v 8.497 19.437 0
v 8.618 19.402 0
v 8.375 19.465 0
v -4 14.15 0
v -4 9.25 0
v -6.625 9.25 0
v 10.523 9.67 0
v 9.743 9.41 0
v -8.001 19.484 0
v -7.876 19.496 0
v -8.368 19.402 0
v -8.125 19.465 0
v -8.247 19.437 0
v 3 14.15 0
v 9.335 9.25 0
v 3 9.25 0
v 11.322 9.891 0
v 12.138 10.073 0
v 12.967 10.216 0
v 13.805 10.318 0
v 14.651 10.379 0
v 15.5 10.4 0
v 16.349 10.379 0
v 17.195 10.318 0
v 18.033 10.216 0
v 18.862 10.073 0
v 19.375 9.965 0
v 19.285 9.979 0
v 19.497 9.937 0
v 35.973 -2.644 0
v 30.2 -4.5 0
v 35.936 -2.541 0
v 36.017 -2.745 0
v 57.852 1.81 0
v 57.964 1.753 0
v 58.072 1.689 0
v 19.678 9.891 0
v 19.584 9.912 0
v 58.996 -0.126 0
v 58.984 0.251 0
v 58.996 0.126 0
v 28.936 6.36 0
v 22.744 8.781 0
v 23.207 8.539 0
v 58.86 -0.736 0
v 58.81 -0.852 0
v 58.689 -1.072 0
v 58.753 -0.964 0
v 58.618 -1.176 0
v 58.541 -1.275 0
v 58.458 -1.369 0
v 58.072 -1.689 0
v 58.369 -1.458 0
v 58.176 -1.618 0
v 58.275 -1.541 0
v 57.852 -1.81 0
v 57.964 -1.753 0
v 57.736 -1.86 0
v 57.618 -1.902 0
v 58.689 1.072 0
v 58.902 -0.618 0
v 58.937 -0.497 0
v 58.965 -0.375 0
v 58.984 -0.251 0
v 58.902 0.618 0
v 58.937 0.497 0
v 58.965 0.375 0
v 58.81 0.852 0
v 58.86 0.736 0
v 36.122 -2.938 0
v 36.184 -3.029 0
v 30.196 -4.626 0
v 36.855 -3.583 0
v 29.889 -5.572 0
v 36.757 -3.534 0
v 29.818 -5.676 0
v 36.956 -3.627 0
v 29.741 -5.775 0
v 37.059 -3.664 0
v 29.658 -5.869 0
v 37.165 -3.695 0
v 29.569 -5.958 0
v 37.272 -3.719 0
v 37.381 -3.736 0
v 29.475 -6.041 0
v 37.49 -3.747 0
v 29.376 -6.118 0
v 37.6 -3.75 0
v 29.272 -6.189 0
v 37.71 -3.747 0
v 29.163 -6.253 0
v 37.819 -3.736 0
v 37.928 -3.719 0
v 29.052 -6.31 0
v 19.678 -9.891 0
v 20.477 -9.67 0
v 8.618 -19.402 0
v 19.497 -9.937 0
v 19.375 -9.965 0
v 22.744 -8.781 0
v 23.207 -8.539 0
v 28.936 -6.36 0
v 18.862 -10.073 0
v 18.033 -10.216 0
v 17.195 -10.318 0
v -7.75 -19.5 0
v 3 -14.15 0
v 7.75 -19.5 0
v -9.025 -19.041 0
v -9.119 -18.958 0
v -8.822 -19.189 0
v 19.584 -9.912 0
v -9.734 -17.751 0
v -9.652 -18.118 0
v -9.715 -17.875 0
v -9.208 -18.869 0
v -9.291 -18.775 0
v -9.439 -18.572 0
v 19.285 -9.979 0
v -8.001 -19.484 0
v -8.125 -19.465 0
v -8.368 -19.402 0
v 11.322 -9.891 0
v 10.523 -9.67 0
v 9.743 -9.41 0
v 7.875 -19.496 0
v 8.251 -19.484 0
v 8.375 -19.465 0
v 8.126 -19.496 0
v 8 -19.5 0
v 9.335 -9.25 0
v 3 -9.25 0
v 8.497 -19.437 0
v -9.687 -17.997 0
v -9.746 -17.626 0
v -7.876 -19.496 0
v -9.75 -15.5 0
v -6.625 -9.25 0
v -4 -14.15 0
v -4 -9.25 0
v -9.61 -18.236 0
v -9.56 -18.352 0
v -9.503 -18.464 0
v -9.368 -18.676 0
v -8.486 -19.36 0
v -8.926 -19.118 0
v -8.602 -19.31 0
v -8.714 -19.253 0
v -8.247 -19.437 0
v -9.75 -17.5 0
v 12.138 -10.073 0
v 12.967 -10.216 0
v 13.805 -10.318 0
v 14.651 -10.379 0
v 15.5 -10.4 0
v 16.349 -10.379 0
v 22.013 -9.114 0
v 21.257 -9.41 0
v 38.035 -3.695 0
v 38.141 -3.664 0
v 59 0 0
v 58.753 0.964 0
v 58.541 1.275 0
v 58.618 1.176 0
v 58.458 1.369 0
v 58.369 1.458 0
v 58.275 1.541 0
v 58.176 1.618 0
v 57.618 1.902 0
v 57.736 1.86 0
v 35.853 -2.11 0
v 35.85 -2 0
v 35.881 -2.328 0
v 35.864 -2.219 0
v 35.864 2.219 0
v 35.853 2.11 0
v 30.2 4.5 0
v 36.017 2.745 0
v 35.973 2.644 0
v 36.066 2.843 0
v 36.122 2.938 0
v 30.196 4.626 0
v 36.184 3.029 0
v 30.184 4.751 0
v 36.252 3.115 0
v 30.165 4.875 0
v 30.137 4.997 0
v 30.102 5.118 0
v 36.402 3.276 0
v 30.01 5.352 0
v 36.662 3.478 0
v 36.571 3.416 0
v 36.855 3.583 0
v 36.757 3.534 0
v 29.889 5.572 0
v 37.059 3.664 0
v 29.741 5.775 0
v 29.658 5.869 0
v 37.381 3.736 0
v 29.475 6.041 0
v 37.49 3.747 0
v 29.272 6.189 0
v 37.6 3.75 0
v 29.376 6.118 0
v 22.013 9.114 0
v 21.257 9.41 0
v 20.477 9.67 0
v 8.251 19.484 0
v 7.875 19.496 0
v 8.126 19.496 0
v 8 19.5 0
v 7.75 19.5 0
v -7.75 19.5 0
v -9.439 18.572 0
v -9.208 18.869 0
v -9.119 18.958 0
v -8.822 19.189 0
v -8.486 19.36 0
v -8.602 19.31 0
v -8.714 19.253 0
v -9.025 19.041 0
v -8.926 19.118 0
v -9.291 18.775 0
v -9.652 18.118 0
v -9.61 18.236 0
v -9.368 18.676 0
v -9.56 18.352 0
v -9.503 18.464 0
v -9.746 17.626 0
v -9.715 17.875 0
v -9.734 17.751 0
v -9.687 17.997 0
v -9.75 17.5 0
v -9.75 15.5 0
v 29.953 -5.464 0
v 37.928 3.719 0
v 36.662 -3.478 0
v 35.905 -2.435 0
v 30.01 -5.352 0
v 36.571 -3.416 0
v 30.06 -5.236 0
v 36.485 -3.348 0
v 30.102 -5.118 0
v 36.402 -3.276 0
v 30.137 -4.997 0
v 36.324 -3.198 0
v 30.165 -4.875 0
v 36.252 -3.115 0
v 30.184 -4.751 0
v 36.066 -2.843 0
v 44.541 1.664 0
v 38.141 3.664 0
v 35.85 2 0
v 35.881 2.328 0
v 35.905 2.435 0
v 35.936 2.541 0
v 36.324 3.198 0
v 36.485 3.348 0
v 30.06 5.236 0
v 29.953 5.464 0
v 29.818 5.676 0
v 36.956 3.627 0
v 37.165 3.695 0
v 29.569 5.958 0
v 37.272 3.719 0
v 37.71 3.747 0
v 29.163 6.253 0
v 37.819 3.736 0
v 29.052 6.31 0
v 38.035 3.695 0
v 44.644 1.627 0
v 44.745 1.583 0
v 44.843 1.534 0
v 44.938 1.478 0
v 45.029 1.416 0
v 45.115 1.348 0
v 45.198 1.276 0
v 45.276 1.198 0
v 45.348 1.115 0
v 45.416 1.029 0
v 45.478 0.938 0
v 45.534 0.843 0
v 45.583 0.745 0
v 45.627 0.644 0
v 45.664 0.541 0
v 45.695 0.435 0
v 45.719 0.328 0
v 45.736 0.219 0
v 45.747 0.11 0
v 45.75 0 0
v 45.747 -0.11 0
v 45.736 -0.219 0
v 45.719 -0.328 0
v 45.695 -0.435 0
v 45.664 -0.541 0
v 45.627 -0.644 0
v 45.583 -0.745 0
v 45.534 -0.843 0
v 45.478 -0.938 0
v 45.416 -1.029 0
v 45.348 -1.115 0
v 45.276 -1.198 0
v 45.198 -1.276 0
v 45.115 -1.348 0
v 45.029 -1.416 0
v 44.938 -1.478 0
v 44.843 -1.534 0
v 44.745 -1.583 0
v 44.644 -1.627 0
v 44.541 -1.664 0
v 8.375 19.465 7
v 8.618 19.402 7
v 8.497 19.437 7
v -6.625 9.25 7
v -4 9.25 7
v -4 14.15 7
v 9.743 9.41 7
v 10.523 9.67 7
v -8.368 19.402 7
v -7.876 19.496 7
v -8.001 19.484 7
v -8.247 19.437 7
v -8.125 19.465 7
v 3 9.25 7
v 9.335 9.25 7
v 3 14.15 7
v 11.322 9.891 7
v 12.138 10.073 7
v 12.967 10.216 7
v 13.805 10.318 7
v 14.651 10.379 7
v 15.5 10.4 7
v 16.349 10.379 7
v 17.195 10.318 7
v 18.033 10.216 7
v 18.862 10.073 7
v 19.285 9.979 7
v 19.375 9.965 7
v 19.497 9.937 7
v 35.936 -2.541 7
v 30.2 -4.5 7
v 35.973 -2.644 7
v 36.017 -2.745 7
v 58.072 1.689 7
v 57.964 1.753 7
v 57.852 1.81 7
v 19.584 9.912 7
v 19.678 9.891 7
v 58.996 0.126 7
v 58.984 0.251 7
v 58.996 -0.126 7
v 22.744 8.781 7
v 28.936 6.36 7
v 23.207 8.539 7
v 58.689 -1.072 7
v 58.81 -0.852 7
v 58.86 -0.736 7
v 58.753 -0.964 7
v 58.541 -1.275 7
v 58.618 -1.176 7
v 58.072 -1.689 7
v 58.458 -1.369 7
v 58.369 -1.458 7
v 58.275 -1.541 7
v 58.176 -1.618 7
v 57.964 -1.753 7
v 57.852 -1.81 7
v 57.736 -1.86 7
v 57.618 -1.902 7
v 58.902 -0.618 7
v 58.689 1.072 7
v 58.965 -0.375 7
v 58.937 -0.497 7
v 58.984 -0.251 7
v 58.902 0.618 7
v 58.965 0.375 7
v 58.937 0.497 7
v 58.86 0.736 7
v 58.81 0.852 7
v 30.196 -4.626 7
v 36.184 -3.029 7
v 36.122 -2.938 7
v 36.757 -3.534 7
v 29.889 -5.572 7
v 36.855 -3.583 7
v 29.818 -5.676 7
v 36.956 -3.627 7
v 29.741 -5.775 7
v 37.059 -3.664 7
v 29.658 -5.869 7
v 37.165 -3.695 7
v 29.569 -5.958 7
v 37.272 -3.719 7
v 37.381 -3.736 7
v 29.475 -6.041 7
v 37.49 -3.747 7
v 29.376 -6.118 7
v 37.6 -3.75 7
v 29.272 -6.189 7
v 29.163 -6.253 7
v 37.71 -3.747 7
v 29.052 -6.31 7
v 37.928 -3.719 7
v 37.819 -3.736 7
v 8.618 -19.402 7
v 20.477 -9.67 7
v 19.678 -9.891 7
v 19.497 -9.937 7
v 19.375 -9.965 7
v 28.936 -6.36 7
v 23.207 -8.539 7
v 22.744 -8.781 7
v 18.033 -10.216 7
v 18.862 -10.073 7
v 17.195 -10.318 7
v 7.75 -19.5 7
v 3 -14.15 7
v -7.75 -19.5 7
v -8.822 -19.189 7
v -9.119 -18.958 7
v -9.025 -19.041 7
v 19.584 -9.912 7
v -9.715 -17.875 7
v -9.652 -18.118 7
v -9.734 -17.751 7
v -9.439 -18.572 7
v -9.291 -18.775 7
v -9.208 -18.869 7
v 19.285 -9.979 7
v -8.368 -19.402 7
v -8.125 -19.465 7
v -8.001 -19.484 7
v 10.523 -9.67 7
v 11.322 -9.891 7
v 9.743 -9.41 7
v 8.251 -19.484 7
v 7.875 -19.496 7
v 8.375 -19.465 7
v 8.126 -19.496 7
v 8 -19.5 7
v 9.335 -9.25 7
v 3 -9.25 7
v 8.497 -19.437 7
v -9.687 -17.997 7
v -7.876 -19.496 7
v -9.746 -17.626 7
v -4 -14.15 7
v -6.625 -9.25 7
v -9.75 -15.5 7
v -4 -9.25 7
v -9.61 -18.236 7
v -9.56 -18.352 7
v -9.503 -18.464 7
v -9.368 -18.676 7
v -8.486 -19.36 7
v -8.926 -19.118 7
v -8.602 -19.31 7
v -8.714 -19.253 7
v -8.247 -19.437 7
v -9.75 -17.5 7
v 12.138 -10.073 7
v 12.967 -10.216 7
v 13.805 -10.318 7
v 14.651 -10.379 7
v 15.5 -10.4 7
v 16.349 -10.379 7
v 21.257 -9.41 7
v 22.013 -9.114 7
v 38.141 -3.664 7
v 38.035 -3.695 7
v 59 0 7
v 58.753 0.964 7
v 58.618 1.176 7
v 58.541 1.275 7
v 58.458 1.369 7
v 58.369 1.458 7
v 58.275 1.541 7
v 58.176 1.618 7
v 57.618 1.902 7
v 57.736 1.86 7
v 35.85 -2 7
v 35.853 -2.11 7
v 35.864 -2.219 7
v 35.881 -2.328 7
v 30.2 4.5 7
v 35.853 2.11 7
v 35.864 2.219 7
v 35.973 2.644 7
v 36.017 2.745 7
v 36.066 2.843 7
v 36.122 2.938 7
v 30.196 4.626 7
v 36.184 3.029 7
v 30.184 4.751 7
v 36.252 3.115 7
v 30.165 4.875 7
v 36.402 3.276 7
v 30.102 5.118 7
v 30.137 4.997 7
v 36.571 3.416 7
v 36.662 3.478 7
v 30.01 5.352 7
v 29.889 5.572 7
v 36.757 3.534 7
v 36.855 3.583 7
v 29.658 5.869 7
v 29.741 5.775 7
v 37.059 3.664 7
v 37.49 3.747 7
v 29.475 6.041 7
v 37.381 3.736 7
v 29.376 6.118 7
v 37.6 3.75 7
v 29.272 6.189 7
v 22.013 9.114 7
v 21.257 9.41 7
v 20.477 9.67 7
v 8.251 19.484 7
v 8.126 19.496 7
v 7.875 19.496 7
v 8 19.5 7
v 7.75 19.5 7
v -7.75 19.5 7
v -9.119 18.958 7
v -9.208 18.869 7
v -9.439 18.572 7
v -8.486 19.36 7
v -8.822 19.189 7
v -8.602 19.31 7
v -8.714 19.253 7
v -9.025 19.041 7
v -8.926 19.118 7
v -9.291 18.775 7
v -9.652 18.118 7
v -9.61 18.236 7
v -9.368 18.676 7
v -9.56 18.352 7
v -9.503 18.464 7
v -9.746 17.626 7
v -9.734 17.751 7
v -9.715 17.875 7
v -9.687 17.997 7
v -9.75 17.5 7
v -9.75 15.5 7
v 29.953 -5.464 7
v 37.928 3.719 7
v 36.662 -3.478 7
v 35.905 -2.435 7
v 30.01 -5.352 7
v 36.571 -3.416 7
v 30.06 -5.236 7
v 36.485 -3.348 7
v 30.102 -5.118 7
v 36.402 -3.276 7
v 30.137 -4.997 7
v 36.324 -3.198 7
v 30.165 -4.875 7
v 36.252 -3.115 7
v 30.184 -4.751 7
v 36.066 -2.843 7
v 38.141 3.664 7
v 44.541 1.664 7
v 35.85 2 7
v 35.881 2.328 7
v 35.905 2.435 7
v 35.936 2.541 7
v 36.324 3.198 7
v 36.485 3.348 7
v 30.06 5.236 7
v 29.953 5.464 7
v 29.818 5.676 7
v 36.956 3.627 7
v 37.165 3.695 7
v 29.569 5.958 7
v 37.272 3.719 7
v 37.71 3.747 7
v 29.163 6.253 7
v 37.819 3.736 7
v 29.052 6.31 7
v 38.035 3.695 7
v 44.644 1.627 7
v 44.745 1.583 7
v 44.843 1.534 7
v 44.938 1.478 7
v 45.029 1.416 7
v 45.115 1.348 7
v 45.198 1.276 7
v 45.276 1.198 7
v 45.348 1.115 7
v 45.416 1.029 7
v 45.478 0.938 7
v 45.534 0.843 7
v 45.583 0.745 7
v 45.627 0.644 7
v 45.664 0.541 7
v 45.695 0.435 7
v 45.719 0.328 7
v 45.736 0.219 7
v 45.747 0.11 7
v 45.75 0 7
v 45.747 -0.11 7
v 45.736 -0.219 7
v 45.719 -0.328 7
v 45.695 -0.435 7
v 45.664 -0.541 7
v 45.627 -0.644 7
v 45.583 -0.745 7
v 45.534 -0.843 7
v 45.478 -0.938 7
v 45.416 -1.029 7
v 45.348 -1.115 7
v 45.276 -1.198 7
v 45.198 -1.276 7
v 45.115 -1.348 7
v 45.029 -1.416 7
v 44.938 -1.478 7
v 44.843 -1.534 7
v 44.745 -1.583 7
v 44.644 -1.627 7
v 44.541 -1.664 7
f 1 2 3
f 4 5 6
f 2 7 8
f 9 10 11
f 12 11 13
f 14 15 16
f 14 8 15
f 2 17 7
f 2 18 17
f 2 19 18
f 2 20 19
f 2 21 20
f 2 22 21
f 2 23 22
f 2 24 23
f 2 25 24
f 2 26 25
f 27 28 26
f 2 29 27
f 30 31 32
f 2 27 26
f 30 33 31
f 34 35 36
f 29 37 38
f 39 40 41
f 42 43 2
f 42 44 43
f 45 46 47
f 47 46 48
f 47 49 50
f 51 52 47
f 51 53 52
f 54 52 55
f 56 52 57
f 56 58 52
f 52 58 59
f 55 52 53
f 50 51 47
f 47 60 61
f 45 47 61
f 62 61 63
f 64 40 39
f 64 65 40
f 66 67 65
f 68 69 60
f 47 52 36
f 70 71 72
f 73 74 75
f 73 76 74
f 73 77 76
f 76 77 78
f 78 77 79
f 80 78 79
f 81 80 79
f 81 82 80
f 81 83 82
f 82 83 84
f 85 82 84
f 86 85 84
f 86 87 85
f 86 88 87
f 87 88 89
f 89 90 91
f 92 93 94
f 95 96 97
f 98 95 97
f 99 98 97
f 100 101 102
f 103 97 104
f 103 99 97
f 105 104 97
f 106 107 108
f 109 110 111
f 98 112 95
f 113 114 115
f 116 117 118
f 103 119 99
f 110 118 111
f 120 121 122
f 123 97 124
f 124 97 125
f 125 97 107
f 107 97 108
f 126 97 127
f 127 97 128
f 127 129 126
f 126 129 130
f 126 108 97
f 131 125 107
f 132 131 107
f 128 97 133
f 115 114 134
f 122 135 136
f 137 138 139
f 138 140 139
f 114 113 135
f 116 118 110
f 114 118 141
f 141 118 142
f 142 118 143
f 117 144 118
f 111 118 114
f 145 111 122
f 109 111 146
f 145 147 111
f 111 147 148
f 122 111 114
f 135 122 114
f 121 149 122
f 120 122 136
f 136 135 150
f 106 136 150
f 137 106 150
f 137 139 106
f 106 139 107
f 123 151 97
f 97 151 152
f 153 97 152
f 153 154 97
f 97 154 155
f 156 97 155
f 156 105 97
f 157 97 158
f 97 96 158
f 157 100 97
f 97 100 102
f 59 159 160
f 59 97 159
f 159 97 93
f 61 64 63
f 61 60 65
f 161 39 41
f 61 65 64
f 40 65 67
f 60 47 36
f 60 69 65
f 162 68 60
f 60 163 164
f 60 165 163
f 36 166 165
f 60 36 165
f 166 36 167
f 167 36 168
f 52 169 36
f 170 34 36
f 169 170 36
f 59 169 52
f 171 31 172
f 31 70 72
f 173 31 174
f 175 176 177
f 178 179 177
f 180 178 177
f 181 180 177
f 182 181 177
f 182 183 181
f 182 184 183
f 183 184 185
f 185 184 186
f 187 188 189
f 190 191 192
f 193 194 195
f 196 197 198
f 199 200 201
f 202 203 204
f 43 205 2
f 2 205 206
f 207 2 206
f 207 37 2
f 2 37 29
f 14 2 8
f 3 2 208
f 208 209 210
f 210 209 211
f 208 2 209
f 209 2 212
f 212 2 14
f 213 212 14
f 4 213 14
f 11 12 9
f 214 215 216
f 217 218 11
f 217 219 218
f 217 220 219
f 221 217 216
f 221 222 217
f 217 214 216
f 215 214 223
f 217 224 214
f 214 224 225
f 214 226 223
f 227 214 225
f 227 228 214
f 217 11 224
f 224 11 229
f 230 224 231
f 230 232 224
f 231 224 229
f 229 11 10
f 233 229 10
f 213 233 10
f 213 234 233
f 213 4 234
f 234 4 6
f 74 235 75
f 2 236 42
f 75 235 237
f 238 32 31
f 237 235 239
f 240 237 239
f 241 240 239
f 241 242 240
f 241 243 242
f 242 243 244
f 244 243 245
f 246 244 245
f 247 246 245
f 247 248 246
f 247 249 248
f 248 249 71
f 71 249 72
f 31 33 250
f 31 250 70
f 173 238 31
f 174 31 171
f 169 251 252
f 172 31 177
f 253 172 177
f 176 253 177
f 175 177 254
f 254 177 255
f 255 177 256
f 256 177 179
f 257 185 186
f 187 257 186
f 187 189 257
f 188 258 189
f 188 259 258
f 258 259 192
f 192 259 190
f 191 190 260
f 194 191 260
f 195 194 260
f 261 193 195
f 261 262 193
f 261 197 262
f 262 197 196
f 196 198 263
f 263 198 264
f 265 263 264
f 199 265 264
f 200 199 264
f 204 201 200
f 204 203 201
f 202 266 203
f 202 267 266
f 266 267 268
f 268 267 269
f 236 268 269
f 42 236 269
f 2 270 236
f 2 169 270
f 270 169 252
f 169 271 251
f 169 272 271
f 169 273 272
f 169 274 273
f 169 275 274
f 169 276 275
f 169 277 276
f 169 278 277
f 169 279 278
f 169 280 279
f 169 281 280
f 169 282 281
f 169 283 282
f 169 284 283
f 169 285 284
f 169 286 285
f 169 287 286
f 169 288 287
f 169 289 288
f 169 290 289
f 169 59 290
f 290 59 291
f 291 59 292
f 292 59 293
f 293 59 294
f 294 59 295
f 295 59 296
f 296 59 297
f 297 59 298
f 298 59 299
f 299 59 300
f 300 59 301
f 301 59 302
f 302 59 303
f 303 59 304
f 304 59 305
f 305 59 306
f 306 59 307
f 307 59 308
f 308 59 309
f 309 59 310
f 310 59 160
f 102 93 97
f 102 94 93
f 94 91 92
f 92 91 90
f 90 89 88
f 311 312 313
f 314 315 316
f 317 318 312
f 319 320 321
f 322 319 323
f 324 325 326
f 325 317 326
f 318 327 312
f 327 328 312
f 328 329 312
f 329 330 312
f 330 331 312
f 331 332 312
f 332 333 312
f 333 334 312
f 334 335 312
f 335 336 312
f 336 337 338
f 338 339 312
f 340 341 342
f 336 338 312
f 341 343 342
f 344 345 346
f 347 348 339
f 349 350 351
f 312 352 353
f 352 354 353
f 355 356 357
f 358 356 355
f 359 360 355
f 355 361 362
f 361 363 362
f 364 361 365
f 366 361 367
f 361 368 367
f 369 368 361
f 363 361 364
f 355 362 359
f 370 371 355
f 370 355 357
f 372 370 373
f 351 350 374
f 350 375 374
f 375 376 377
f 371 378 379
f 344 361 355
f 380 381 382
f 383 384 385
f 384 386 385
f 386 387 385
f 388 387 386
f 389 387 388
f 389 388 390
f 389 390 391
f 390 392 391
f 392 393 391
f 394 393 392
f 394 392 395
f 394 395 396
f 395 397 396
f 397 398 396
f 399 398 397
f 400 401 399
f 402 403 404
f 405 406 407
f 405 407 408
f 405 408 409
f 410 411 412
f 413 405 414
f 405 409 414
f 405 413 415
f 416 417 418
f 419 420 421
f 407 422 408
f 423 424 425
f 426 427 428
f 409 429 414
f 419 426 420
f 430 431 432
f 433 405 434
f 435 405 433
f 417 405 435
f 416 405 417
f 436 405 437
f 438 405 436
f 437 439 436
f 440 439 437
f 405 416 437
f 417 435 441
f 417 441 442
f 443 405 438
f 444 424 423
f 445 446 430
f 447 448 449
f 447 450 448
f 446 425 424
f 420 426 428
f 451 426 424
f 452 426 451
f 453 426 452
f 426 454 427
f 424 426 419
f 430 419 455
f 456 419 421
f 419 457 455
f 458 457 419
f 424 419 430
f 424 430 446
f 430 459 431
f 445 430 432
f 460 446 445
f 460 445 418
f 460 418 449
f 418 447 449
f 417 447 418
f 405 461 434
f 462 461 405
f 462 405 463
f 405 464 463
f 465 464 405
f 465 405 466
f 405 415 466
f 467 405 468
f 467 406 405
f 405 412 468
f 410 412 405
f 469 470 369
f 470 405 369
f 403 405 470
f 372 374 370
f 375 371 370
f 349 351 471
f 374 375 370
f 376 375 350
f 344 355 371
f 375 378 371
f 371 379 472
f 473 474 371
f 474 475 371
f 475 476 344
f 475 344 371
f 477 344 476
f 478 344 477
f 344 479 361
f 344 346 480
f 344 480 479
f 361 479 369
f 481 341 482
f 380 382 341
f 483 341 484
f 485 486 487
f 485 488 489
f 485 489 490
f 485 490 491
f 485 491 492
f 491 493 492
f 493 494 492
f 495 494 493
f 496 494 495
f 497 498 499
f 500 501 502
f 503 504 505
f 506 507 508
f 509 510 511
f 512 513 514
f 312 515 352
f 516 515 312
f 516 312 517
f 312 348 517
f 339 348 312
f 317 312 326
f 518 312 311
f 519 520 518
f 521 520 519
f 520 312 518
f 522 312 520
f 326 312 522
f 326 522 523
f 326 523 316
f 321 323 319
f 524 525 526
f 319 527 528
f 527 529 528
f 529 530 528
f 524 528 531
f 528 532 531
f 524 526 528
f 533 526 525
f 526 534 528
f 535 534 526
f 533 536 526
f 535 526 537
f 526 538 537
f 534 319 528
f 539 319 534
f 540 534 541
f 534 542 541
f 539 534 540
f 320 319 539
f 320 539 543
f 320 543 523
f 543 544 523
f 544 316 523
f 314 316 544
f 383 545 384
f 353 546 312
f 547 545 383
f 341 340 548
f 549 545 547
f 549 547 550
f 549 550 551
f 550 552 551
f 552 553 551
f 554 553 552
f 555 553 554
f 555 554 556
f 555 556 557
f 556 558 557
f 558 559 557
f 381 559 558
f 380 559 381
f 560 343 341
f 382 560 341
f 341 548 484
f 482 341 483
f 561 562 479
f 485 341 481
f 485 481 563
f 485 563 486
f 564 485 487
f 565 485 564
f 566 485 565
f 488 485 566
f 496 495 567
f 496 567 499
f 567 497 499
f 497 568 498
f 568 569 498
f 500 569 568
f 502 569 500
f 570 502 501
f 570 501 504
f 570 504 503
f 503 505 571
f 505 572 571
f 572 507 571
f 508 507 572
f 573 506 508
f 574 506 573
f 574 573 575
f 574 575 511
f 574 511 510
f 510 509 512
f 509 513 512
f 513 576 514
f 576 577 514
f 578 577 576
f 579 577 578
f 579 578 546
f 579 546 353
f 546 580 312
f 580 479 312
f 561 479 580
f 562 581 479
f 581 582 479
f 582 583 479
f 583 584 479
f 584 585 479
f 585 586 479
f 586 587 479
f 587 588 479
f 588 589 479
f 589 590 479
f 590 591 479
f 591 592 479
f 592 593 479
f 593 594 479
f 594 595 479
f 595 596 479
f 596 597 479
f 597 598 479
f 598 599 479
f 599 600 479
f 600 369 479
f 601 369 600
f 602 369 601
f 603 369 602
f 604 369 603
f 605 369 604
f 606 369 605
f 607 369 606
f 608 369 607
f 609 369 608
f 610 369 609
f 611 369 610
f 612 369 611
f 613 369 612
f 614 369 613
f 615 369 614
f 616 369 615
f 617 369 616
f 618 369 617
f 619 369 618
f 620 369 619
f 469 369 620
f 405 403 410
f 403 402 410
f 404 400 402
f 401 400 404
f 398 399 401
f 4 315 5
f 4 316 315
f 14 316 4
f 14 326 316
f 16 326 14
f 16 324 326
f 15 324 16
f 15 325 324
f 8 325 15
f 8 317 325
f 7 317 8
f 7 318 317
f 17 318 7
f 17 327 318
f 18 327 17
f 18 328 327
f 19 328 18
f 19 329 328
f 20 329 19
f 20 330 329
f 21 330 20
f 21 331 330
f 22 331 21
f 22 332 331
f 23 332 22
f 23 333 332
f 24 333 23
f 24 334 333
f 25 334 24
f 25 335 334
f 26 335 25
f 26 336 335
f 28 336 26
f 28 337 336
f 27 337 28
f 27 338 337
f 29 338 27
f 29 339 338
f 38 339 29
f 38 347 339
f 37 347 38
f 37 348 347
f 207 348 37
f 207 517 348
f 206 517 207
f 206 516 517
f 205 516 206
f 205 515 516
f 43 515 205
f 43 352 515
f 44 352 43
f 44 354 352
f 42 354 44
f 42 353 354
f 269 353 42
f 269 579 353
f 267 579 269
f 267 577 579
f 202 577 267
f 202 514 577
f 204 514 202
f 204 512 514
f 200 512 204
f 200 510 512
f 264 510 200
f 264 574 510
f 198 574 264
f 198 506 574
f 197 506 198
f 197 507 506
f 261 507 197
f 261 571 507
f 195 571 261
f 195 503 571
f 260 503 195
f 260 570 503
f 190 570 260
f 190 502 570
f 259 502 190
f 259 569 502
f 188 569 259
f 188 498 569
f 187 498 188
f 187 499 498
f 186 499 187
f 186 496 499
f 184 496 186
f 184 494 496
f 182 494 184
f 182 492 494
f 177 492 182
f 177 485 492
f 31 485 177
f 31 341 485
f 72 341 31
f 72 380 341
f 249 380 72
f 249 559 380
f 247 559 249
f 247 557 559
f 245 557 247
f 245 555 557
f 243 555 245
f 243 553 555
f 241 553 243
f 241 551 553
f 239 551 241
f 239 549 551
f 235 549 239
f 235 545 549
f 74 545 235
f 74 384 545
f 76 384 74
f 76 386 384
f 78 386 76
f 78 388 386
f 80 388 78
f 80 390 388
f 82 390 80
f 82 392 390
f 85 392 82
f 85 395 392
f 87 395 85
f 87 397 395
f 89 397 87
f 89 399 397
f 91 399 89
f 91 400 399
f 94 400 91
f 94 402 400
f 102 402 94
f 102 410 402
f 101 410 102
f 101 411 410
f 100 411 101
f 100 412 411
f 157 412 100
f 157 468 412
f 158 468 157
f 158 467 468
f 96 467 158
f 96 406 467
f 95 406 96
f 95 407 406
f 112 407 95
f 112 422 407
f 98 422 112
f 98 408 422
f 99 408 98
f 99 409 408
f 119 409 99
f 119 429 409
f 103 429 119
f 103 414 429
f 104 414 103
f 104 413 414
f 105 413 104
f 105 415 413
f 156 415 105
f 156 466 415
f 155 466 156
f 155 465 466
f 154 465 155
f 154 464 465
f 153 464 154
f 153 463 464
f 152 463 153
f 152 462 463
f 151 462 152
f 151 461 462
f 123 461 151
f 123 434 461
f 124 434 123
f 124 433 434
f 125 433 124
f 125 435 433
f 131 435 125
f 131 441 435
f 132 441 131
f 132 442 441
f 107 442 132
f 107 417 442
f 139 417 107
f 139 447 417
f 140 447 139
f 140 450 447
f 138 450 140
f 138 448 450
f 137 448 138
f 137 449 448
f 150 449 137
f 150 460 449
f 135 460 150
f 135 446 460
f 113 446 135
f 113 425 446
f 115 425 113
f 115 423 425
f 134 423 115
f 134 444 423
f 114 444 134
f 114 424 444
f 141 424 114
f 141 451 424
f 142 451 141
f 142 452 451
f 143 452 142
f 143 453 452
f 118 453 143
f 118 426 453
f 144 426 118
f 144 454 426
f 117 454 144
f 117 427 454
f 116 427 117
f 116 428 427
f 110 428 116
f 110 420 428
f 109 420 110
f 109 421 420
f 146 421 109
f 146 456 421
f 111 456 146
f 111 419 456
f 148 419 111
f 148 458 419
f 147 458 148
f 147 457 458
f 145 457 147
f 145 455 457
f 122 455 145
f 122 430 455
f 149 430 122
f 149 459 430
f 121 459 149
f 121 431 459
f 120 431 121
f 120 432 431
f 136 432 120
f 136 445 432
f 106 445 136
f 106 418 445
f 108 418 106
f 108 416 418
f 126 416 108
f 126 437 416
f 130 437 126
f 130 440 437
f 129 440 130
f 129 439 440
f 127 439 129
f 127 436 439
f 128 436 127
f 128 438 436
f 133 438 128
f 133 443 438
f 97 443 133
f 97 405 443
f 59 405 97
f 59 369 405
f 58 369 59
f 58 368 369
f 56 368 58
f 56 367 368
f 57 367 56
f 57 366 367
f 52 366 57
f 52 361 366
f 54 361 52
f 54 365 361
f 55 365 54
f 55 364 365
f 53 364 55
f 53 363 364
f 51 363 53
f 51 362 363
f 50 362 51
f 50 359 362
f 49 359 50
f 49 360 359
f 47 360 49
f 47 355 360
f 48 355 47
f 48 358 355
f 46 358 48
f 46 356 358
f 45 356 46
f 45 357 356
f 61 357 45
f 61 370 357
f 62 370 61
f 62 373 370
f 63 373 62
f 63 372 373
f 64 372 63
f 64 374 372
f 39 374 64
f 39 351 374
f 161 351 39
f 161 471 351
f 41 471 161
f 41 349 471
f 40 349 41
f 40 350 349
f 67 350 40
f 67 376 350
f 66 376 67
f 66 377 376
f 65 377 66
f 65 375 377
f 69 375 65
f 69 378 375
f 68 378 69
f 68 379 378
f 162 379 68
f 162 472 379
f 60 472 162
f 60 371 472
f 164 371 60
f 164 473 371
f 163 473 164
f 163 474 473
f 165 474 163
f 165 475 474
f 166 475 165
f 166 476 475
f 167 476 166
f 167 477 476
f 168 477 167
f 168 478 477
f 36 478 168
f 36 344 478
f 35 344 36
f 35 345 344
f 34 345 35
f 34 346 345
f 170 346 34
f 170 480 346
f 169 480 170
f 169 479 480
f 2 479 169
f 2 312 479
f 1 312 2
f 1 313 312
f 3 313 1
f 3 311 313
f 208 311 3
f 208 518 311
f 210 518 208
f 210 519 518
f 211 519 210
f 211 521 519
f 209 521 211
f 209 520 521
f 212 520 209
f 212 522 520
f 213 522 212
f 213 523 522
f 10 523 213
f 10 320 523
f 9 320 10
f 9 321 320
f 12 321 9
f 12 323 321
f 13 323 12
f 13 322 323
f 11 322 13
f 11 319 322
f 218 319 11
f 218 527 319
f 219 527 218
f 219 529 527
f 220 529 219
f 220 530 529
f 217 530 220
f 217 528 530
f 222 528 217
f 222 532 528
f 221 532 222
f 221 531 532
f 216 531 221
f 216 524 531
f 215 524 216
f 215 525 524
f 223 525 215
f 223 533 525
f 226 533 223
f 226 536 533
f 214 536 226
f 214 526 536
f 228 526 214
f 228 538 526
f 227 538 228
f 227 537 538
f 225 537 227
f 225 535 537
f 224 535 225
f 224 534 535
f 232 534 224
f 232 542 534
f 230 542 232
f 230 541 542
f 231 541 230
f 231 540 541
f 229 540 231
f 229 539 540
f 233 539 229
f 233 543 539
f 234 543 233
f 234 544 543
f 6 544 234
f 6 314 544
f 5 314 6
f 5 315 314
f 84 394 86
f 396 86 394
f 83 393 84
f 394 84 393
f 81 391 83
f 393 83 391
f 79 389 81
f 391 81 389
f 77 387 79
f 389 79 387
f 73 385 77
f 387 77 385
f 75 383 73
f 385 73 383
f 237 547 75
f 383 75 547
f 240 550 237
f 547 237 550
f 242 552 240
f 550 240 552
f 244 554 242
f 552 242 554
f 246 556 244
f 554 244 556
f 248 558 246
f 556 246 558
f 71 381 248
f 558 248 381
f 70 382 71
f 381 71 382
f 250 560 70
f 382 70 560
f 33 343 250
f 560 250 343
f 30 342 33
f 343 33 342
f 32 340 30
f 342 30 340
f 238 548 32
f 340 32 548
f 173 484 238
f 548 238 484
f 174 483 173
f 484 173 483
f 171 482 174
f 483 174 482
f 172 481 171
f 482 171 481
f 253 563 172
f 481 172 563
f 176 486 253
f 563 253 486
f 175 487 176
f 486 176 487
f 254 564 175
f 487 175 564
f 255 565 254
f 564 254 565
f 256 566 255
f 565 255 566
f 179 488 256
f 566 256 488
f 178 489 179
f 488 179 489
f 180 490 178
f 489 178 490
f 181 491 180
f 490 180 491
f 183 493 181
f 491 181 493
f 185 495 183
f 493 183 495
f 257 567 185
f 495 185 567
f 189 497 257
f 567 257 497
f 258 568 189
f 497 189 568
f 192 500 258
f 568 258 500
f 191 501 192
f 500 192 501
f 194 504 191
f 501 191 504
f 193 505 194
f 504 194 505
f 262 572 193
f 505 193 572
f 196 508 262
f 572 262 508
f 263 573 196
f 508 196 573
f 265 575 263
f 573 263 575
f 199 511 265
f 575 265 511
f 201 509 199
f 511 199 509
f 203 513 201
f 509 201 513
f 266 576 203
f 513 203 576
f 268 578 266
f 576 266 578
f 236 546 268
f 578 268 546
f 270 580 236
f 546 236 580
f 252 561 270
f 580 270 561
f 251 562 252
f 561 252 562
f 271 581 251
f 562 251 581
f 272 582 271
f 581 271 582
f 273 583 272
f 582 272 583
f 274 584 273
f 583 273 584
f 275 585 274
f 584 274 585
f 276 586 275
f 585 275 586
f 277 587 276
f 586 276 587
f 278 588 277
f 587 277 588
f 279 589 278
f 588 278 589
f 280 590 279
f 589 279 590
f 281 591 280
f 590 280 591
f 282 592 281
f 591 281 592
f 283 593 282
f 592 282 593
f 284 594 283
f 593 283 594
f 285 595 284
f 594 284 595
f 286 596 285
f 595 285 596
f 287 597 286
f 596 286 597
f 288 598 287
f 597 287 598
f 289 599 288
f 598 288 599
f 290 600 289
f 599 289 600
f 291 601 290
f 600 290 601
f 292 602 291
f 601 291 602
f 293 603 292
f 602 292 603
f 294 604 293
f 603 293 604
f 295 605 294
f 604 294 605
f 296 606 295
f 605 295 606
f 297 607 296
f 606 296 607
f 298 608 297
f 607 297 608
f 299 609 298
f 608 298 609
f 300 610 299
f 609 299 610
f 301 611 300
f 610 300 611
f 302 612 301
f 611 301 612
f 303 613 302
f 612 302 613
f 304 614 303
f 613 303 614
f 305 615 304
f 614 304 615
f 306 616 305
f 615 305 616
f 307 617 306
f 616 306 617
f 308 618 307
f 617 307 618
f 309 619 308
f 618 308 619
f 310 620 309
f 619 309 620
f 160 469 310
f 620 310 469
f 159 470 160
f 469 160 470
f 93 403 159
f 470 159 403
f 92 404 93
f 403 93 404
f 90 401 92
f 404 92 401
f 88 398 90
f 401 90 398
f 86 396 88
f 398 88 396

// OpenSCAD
/*Replacement landing strut to fit
original Hoverthings Flip arm*/

//Dimensions
thickness=7;
arm_slot_width=28.3;
arm_slot_height=7;
total_height=59.5; //from center of arm slot

$fn=100;

// extrusion height will be thickness
linear_extrude(height=thickness) {
  difference() {
    // base shape
    union() {
      minkowski() {
        polygon(points=[[8,17.5],[(total_height-2.5),0],[8,-17.5]]);
        circle(r=2);
      }
      minkowski() {
        square([15.5,35],center=true);
        circle(r=2);
      }
    }
    // vertical slot
    square([25,18.5],center=true);
    // horizontal slot for arm
    translate([-0.5,0]) square([arm_slot_height,arm_slot_width],center=true);
    // top finger tapers
    for(i=[-1:1])
      polygon(points=[[-9.75,8*i],[-9.75,15.5*i],[-6,8*i]]);
    // small triangular cutout
    minkowski() {
      polygon(points=[[37.6,-2],[37.6,2],[(total_height-15.5),0]]);
      circle(r=1.75);
    }
    translate([15.5,0]) scale([1.3,1]) circle(r=10.4);
    // rounded main cutout
    minkowski() {
      polygon(points=[[19,-8],[19,8],[28.2,4.5],[28.2,-4.5]]);
      circle(r=2); 
    }
  }
}
